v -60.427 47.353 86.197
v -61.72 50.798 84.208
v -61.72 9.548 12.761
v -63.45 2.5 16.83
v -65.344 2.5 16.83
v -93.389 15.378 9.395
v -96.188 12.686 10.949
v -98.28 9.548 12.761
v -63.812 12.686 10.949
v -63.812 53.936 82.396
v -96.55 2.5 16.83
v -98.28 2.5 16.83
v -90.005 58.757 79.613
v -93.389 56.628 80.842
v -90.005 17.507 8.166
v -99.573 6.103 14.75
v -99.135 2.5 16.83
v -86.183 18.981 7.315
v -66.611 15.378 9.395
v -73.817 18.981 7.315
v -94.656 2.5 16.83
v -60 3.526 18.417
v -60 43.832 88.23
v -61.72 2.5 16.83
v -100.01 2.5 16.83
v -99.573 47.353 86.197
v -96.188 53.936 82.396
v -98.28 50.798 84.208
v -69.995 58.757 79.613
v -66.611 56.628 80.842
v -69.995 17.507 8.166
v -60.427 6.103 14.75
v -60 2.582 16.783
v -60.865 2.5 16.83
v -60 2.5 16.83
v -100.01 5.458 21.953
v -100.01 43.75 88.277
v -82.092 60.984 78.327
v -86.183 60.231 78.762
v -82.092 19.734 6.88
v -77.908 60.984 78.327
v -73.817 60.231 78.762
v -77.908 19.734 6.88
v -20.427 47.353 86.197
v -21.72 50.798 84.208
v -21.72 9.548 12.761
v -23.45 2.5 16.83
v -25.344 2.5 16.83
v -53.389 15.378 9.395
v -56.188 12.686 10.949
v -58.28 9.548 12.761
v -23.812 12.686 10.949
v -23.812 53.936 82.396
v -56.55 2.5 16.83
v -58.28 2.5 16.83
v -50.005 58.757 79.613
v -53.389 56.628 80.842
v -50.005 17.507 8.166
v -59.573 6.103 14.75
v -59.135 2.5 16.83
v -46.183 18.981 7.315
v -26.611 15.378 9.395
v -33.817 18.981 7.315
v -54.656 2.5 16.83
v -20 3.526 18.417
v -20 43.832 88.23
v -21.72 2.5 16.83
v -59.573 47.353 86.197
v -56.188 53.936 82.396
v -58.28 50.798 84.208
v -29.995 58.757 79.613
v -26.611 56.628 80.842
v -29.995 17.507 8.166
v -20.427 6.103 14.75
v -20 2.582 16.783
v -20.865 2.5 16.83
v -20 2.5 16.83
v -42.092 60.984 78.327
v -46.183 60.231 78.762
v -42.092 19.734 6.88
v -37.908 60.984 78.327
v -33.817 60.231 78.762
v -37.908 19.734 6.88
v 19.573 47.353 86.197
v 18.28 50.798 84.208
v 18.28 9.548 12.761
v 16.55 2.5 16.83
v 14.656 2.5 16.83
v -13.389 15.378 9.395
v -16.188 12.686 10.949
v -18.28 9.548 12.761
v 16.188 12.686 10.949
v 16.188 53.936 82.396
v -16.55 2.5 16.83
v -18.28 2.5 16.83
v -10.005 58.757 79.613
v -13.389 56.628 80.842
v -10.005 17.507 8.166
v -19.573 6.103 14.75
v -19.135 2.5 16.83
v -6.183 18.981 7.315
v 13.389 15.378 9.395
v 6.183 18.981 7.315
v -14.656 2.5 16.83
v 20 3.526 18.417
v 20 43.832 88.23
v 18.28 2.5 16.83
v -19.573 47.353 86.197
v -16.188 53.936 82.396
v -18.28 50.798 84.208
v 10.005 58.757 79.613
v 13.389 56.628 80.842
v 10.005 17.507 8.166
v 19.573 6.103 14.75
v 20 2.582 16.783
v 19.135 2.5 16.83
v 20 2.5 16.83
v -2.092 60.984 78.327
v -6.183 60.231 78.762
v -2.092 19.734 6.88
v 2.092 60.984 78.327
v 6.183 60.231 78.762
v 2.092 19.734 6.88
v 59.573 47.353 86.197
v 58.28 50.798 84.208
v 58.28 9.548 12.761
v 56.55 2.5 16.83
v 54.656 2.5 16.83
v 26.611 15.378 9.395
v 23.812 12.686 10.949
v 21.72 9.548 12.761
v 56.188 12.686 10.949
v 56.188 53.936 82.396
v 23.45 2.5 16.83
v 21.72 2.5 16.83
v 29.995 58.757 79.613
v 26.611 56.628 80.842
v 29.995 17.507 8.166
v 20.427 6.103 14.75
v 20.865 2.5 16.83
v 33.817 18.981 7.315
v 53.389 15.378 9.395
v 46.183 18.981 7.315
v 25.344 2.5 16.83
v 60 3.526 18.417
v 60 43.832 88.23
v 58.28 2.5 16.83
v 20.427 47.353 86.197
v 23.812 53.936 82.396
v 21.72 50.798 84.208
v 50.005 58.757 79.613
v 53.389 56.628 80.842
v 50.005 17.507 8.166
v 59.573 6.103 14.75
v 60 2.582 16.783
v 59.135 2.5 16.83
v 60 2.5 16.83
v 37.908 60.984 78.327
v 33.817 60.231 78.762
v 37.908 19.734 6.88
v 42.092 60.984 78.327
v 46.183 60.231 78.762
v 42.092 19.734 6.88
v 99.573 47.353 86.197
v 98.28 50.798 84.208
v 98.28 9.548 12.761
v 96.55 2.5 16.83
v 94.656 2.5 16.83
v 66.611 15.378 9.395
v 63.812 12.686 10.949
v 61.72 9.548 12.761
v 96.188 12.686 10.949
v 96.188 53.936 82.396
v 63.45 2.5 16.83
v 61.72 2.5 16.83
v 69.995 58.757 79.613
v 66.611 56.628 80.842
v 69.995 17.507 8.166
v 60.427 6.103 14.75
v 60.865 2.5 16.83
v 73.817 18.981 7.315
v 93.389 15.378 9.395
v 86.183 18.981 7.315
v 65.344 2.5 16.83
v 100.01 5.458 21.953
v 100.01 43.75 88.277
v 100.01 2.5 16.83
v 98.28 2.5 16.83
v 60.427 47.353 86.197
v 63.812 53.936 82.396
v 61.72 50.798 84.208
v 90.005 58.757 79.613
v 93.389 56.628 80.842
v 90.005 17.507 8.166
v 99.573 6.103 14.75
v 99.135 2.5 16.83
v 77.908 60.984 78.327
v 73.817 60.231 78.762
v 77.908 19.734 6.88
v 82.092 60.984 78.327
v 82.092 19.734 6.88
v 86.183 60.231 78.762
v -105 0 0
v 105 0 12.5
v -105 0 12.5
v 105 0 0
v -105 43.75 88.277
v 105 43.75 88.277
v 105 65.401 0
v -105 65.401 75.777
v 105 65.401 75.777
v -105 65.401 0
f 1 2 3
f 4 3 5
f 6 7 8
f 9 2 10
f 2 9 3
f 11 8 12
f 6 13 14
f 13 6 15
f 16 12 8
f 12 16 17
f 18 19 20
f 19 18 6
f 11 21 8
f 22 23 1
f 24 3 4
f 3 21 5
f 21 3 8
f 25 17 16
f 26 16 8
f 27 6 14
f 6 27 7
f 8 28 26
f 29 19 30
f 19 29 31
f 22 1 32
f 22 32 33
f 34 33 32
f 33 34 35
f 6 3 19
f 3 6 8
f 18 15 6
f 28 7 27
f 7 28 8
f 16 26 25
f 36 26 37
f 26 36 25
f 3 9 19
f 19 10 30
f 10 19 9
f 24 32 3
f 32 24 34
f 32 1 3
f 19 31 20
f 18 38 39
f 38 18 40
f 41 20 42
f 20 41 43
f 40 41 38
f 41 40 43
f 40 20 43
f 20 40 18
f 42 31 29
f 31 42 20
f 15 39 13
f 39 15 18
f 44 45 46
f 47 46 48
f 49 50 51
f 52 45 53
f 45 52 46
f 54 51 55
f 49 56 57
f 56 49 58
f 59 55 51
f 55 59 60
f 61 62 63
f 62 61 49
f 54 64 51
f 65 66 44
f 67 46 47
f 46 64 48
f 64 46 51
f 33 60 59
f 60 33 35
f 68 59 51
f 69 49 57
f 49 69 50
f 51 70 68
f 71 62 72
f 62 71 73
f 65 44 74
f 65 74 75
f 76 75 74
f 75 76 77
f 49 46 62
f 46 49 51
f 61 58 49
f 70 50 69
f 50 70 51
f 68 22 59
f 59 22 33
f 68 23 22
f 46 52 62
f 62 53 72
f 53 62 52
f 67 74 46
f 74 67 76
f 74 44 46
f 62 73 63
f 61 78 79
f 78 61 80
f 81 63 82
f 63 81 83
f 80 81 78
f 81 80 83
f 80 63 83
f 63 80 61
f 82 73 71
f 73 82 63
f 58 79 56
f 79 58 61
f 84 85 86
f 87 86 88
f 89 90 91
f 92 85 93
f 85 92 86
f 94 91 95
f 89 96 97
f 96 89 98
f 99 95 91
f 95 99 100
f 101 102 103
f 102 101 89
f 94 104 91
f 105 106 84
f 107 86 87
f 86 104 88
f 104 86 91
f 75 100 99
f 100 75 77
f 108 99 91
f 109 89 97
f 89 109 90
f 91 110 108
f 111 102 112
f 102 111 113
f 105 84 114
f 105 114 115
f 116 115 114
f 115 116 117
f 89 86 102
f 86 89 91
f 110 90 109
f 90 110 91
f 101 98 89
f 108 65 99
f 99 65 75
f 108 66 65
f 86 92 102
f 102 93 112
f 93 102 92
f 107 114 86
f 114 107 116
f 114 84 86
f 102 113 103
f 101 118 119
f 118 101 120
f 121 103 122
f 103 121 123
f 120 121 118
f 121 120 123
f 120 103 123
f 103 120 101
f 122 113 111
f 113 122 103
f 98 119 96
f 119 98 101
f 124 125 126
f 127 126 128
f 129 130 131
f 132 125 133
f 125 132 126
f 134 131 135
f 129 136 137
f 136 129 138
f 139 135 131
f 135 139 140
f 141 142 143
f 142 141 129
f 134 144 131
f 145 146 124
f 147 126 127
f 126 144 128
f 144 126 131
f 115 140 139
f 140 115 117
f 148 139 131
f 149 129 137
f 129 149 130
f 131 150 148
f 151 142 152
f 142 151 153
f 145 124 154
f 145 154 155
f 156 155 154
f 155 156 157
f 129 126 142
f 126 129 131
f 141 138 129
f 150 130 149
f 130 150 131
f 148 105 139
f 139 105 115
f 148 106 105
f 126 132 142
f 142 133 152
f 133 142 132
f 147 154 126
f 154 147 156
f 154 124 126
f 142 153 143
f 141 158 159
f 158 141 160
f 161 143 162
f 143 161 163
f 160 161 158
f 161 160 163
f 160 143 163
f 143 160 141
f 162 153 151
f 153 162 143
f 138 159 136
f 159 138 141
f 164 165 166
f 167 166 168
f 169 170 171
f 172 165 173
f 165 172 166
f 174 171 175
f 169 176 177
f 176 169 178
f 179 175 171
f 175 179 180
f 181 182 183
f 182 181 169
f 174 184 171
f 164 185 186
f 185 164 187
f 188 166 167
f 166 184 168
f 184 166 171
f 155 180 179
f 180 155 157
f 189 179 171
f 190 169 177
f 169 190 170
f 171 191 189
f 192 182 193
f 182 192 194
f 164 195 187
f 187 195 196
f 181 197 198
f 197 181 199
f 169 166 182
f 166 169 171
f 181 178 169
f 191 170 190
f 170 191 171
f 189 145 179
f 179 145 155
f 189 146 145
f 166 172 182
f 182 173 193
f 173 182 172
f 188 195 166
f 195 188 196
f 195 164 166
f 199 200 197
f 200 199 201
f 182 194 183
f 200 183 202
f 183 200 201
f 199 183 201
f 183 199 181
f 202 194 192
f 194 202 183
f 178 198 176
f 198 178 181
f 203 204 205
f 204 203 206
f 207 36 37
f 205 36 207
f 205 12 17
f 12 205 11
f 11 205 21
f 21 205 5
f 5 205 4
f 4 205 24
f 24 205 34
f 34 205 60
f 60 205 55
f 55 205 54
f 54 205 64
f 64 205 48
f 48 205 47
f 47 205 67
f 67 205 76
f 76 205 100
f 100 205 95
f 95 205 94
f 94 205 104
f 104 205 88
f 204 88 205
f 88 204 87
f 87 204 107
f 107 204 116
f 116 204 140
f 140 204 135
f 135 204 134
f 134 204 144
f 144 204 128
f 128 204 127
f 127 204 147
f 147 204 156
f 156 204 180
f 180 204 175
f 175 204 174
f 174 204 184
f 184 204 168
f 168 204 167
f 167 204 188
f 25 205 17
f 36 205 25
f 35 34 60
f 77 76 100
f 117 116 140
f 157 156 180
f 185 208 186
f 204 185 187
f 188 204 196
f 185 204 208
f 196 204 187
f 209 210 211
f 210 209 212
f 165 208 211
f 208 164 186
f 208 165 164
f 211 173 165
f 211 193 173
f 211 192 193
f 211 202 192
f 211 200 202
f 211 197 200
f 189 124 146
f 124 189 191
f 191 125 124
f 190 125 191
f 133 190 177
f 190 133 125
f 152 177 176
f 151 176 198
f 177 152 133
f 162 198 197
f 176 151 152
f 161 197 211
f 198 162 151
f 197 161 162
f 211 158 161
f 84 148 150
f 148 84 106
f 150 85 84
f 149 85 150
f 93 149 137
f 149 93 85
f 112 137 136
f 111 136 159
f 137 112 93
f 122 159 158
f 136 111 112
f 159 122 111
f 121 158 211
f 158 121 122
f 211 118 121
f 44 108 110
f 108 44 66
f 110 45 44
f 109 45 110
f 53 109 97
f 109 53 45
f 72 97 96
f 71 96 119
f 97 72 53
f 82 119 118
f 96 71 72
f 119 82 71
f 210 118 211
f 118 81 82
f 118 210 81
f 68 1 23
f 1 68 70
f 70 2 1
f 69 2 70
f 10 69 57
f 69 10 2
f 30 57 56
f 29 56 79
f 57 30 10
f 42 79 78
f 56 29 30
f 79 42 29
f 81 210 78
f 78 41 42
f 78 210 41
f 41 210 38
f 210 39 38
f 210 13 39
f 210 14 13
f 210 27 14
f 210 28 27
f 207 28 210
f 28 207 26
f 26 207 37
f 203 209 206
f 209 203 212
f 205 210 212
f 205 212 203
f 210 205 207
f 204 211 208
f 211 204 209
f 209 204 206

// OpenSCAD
// file: ../config.scad
default_token_radius = 10;
default_token_height = 4;
default_token_hole_margin = 0.2;
eps = 0.01;
// file: ../casino_chip_tray.scad
include <config.scad>;
casino_chip_radius = 40/2;
casino_chip_height = 3.3;
min_thickness = 5;

module casino_chip_tray(angle,length, columns=1) {
    width = casino_chip_radius*2*columns + min_thickness*2;
    //height = cos(angle)*(casino_chip_radius + min_thickness) +
    module base() {
        rotate([90, 0, 90])linear_extrude(width, center=true) polygon([
            [0, 0],
            [0, cos(angle) * (casino_chip_radius + min_thickness)],
            [cos(angle)*(length+min_thickness), cos(angle) * (casino_chip_radius + min_thickness) +sin(angle) * (length + min_thickness)],
            [sin(angle)*(casino_chip_radius + min_thickness) + cos(angle) * (length + min_thickness), sin(angle)*(length + min_thickness)],
            [sin(angle)*(casino_chip_radius + min_thickness) + cos(angle) * (length+ min_thickness), 0]
        
        ]);
    }
    module groove() {
         translate([0, 0, cos(angle) * (casino_chip_radius + min_thickness)]) rotate([90-angle, 0, 180]) translate([0, 0, min_thickness]) cylinder(h=(length+eps), r=casino_chip_radius + eps, center=false);
    } 
    difference(){
        base();
        translate([-width/2 + min_thickness + casino_chip_radius, 0, 0]){
            for( i= [1:columns]){
                translate([(i-1)*casino_chip_radius*2, 0, 0]) groove();
            }
        }    
    }
}
translate([0, -100, 0]) casino_chip_tray(angle=60, length = casino_chip_height*25, columns=3);
translate([-60, 0, 0]) casino_chip_tray(angle = 0, length = casino_chip_height * 25 );
translate([0, 0, 0]) casino_chip_tray(angle = 45, length = casino_chip_height * 25);
translate([60, 0, 0]) casino_chip_tray(angle = 90, length = casino_chip_height * 25);
// main file
use <../casino_chip_tray.scad>;
casino_chip_thickness=3.3;
casino_chip_tray(angle=60, length = casino_chip_thickness * 25, columns=5);
